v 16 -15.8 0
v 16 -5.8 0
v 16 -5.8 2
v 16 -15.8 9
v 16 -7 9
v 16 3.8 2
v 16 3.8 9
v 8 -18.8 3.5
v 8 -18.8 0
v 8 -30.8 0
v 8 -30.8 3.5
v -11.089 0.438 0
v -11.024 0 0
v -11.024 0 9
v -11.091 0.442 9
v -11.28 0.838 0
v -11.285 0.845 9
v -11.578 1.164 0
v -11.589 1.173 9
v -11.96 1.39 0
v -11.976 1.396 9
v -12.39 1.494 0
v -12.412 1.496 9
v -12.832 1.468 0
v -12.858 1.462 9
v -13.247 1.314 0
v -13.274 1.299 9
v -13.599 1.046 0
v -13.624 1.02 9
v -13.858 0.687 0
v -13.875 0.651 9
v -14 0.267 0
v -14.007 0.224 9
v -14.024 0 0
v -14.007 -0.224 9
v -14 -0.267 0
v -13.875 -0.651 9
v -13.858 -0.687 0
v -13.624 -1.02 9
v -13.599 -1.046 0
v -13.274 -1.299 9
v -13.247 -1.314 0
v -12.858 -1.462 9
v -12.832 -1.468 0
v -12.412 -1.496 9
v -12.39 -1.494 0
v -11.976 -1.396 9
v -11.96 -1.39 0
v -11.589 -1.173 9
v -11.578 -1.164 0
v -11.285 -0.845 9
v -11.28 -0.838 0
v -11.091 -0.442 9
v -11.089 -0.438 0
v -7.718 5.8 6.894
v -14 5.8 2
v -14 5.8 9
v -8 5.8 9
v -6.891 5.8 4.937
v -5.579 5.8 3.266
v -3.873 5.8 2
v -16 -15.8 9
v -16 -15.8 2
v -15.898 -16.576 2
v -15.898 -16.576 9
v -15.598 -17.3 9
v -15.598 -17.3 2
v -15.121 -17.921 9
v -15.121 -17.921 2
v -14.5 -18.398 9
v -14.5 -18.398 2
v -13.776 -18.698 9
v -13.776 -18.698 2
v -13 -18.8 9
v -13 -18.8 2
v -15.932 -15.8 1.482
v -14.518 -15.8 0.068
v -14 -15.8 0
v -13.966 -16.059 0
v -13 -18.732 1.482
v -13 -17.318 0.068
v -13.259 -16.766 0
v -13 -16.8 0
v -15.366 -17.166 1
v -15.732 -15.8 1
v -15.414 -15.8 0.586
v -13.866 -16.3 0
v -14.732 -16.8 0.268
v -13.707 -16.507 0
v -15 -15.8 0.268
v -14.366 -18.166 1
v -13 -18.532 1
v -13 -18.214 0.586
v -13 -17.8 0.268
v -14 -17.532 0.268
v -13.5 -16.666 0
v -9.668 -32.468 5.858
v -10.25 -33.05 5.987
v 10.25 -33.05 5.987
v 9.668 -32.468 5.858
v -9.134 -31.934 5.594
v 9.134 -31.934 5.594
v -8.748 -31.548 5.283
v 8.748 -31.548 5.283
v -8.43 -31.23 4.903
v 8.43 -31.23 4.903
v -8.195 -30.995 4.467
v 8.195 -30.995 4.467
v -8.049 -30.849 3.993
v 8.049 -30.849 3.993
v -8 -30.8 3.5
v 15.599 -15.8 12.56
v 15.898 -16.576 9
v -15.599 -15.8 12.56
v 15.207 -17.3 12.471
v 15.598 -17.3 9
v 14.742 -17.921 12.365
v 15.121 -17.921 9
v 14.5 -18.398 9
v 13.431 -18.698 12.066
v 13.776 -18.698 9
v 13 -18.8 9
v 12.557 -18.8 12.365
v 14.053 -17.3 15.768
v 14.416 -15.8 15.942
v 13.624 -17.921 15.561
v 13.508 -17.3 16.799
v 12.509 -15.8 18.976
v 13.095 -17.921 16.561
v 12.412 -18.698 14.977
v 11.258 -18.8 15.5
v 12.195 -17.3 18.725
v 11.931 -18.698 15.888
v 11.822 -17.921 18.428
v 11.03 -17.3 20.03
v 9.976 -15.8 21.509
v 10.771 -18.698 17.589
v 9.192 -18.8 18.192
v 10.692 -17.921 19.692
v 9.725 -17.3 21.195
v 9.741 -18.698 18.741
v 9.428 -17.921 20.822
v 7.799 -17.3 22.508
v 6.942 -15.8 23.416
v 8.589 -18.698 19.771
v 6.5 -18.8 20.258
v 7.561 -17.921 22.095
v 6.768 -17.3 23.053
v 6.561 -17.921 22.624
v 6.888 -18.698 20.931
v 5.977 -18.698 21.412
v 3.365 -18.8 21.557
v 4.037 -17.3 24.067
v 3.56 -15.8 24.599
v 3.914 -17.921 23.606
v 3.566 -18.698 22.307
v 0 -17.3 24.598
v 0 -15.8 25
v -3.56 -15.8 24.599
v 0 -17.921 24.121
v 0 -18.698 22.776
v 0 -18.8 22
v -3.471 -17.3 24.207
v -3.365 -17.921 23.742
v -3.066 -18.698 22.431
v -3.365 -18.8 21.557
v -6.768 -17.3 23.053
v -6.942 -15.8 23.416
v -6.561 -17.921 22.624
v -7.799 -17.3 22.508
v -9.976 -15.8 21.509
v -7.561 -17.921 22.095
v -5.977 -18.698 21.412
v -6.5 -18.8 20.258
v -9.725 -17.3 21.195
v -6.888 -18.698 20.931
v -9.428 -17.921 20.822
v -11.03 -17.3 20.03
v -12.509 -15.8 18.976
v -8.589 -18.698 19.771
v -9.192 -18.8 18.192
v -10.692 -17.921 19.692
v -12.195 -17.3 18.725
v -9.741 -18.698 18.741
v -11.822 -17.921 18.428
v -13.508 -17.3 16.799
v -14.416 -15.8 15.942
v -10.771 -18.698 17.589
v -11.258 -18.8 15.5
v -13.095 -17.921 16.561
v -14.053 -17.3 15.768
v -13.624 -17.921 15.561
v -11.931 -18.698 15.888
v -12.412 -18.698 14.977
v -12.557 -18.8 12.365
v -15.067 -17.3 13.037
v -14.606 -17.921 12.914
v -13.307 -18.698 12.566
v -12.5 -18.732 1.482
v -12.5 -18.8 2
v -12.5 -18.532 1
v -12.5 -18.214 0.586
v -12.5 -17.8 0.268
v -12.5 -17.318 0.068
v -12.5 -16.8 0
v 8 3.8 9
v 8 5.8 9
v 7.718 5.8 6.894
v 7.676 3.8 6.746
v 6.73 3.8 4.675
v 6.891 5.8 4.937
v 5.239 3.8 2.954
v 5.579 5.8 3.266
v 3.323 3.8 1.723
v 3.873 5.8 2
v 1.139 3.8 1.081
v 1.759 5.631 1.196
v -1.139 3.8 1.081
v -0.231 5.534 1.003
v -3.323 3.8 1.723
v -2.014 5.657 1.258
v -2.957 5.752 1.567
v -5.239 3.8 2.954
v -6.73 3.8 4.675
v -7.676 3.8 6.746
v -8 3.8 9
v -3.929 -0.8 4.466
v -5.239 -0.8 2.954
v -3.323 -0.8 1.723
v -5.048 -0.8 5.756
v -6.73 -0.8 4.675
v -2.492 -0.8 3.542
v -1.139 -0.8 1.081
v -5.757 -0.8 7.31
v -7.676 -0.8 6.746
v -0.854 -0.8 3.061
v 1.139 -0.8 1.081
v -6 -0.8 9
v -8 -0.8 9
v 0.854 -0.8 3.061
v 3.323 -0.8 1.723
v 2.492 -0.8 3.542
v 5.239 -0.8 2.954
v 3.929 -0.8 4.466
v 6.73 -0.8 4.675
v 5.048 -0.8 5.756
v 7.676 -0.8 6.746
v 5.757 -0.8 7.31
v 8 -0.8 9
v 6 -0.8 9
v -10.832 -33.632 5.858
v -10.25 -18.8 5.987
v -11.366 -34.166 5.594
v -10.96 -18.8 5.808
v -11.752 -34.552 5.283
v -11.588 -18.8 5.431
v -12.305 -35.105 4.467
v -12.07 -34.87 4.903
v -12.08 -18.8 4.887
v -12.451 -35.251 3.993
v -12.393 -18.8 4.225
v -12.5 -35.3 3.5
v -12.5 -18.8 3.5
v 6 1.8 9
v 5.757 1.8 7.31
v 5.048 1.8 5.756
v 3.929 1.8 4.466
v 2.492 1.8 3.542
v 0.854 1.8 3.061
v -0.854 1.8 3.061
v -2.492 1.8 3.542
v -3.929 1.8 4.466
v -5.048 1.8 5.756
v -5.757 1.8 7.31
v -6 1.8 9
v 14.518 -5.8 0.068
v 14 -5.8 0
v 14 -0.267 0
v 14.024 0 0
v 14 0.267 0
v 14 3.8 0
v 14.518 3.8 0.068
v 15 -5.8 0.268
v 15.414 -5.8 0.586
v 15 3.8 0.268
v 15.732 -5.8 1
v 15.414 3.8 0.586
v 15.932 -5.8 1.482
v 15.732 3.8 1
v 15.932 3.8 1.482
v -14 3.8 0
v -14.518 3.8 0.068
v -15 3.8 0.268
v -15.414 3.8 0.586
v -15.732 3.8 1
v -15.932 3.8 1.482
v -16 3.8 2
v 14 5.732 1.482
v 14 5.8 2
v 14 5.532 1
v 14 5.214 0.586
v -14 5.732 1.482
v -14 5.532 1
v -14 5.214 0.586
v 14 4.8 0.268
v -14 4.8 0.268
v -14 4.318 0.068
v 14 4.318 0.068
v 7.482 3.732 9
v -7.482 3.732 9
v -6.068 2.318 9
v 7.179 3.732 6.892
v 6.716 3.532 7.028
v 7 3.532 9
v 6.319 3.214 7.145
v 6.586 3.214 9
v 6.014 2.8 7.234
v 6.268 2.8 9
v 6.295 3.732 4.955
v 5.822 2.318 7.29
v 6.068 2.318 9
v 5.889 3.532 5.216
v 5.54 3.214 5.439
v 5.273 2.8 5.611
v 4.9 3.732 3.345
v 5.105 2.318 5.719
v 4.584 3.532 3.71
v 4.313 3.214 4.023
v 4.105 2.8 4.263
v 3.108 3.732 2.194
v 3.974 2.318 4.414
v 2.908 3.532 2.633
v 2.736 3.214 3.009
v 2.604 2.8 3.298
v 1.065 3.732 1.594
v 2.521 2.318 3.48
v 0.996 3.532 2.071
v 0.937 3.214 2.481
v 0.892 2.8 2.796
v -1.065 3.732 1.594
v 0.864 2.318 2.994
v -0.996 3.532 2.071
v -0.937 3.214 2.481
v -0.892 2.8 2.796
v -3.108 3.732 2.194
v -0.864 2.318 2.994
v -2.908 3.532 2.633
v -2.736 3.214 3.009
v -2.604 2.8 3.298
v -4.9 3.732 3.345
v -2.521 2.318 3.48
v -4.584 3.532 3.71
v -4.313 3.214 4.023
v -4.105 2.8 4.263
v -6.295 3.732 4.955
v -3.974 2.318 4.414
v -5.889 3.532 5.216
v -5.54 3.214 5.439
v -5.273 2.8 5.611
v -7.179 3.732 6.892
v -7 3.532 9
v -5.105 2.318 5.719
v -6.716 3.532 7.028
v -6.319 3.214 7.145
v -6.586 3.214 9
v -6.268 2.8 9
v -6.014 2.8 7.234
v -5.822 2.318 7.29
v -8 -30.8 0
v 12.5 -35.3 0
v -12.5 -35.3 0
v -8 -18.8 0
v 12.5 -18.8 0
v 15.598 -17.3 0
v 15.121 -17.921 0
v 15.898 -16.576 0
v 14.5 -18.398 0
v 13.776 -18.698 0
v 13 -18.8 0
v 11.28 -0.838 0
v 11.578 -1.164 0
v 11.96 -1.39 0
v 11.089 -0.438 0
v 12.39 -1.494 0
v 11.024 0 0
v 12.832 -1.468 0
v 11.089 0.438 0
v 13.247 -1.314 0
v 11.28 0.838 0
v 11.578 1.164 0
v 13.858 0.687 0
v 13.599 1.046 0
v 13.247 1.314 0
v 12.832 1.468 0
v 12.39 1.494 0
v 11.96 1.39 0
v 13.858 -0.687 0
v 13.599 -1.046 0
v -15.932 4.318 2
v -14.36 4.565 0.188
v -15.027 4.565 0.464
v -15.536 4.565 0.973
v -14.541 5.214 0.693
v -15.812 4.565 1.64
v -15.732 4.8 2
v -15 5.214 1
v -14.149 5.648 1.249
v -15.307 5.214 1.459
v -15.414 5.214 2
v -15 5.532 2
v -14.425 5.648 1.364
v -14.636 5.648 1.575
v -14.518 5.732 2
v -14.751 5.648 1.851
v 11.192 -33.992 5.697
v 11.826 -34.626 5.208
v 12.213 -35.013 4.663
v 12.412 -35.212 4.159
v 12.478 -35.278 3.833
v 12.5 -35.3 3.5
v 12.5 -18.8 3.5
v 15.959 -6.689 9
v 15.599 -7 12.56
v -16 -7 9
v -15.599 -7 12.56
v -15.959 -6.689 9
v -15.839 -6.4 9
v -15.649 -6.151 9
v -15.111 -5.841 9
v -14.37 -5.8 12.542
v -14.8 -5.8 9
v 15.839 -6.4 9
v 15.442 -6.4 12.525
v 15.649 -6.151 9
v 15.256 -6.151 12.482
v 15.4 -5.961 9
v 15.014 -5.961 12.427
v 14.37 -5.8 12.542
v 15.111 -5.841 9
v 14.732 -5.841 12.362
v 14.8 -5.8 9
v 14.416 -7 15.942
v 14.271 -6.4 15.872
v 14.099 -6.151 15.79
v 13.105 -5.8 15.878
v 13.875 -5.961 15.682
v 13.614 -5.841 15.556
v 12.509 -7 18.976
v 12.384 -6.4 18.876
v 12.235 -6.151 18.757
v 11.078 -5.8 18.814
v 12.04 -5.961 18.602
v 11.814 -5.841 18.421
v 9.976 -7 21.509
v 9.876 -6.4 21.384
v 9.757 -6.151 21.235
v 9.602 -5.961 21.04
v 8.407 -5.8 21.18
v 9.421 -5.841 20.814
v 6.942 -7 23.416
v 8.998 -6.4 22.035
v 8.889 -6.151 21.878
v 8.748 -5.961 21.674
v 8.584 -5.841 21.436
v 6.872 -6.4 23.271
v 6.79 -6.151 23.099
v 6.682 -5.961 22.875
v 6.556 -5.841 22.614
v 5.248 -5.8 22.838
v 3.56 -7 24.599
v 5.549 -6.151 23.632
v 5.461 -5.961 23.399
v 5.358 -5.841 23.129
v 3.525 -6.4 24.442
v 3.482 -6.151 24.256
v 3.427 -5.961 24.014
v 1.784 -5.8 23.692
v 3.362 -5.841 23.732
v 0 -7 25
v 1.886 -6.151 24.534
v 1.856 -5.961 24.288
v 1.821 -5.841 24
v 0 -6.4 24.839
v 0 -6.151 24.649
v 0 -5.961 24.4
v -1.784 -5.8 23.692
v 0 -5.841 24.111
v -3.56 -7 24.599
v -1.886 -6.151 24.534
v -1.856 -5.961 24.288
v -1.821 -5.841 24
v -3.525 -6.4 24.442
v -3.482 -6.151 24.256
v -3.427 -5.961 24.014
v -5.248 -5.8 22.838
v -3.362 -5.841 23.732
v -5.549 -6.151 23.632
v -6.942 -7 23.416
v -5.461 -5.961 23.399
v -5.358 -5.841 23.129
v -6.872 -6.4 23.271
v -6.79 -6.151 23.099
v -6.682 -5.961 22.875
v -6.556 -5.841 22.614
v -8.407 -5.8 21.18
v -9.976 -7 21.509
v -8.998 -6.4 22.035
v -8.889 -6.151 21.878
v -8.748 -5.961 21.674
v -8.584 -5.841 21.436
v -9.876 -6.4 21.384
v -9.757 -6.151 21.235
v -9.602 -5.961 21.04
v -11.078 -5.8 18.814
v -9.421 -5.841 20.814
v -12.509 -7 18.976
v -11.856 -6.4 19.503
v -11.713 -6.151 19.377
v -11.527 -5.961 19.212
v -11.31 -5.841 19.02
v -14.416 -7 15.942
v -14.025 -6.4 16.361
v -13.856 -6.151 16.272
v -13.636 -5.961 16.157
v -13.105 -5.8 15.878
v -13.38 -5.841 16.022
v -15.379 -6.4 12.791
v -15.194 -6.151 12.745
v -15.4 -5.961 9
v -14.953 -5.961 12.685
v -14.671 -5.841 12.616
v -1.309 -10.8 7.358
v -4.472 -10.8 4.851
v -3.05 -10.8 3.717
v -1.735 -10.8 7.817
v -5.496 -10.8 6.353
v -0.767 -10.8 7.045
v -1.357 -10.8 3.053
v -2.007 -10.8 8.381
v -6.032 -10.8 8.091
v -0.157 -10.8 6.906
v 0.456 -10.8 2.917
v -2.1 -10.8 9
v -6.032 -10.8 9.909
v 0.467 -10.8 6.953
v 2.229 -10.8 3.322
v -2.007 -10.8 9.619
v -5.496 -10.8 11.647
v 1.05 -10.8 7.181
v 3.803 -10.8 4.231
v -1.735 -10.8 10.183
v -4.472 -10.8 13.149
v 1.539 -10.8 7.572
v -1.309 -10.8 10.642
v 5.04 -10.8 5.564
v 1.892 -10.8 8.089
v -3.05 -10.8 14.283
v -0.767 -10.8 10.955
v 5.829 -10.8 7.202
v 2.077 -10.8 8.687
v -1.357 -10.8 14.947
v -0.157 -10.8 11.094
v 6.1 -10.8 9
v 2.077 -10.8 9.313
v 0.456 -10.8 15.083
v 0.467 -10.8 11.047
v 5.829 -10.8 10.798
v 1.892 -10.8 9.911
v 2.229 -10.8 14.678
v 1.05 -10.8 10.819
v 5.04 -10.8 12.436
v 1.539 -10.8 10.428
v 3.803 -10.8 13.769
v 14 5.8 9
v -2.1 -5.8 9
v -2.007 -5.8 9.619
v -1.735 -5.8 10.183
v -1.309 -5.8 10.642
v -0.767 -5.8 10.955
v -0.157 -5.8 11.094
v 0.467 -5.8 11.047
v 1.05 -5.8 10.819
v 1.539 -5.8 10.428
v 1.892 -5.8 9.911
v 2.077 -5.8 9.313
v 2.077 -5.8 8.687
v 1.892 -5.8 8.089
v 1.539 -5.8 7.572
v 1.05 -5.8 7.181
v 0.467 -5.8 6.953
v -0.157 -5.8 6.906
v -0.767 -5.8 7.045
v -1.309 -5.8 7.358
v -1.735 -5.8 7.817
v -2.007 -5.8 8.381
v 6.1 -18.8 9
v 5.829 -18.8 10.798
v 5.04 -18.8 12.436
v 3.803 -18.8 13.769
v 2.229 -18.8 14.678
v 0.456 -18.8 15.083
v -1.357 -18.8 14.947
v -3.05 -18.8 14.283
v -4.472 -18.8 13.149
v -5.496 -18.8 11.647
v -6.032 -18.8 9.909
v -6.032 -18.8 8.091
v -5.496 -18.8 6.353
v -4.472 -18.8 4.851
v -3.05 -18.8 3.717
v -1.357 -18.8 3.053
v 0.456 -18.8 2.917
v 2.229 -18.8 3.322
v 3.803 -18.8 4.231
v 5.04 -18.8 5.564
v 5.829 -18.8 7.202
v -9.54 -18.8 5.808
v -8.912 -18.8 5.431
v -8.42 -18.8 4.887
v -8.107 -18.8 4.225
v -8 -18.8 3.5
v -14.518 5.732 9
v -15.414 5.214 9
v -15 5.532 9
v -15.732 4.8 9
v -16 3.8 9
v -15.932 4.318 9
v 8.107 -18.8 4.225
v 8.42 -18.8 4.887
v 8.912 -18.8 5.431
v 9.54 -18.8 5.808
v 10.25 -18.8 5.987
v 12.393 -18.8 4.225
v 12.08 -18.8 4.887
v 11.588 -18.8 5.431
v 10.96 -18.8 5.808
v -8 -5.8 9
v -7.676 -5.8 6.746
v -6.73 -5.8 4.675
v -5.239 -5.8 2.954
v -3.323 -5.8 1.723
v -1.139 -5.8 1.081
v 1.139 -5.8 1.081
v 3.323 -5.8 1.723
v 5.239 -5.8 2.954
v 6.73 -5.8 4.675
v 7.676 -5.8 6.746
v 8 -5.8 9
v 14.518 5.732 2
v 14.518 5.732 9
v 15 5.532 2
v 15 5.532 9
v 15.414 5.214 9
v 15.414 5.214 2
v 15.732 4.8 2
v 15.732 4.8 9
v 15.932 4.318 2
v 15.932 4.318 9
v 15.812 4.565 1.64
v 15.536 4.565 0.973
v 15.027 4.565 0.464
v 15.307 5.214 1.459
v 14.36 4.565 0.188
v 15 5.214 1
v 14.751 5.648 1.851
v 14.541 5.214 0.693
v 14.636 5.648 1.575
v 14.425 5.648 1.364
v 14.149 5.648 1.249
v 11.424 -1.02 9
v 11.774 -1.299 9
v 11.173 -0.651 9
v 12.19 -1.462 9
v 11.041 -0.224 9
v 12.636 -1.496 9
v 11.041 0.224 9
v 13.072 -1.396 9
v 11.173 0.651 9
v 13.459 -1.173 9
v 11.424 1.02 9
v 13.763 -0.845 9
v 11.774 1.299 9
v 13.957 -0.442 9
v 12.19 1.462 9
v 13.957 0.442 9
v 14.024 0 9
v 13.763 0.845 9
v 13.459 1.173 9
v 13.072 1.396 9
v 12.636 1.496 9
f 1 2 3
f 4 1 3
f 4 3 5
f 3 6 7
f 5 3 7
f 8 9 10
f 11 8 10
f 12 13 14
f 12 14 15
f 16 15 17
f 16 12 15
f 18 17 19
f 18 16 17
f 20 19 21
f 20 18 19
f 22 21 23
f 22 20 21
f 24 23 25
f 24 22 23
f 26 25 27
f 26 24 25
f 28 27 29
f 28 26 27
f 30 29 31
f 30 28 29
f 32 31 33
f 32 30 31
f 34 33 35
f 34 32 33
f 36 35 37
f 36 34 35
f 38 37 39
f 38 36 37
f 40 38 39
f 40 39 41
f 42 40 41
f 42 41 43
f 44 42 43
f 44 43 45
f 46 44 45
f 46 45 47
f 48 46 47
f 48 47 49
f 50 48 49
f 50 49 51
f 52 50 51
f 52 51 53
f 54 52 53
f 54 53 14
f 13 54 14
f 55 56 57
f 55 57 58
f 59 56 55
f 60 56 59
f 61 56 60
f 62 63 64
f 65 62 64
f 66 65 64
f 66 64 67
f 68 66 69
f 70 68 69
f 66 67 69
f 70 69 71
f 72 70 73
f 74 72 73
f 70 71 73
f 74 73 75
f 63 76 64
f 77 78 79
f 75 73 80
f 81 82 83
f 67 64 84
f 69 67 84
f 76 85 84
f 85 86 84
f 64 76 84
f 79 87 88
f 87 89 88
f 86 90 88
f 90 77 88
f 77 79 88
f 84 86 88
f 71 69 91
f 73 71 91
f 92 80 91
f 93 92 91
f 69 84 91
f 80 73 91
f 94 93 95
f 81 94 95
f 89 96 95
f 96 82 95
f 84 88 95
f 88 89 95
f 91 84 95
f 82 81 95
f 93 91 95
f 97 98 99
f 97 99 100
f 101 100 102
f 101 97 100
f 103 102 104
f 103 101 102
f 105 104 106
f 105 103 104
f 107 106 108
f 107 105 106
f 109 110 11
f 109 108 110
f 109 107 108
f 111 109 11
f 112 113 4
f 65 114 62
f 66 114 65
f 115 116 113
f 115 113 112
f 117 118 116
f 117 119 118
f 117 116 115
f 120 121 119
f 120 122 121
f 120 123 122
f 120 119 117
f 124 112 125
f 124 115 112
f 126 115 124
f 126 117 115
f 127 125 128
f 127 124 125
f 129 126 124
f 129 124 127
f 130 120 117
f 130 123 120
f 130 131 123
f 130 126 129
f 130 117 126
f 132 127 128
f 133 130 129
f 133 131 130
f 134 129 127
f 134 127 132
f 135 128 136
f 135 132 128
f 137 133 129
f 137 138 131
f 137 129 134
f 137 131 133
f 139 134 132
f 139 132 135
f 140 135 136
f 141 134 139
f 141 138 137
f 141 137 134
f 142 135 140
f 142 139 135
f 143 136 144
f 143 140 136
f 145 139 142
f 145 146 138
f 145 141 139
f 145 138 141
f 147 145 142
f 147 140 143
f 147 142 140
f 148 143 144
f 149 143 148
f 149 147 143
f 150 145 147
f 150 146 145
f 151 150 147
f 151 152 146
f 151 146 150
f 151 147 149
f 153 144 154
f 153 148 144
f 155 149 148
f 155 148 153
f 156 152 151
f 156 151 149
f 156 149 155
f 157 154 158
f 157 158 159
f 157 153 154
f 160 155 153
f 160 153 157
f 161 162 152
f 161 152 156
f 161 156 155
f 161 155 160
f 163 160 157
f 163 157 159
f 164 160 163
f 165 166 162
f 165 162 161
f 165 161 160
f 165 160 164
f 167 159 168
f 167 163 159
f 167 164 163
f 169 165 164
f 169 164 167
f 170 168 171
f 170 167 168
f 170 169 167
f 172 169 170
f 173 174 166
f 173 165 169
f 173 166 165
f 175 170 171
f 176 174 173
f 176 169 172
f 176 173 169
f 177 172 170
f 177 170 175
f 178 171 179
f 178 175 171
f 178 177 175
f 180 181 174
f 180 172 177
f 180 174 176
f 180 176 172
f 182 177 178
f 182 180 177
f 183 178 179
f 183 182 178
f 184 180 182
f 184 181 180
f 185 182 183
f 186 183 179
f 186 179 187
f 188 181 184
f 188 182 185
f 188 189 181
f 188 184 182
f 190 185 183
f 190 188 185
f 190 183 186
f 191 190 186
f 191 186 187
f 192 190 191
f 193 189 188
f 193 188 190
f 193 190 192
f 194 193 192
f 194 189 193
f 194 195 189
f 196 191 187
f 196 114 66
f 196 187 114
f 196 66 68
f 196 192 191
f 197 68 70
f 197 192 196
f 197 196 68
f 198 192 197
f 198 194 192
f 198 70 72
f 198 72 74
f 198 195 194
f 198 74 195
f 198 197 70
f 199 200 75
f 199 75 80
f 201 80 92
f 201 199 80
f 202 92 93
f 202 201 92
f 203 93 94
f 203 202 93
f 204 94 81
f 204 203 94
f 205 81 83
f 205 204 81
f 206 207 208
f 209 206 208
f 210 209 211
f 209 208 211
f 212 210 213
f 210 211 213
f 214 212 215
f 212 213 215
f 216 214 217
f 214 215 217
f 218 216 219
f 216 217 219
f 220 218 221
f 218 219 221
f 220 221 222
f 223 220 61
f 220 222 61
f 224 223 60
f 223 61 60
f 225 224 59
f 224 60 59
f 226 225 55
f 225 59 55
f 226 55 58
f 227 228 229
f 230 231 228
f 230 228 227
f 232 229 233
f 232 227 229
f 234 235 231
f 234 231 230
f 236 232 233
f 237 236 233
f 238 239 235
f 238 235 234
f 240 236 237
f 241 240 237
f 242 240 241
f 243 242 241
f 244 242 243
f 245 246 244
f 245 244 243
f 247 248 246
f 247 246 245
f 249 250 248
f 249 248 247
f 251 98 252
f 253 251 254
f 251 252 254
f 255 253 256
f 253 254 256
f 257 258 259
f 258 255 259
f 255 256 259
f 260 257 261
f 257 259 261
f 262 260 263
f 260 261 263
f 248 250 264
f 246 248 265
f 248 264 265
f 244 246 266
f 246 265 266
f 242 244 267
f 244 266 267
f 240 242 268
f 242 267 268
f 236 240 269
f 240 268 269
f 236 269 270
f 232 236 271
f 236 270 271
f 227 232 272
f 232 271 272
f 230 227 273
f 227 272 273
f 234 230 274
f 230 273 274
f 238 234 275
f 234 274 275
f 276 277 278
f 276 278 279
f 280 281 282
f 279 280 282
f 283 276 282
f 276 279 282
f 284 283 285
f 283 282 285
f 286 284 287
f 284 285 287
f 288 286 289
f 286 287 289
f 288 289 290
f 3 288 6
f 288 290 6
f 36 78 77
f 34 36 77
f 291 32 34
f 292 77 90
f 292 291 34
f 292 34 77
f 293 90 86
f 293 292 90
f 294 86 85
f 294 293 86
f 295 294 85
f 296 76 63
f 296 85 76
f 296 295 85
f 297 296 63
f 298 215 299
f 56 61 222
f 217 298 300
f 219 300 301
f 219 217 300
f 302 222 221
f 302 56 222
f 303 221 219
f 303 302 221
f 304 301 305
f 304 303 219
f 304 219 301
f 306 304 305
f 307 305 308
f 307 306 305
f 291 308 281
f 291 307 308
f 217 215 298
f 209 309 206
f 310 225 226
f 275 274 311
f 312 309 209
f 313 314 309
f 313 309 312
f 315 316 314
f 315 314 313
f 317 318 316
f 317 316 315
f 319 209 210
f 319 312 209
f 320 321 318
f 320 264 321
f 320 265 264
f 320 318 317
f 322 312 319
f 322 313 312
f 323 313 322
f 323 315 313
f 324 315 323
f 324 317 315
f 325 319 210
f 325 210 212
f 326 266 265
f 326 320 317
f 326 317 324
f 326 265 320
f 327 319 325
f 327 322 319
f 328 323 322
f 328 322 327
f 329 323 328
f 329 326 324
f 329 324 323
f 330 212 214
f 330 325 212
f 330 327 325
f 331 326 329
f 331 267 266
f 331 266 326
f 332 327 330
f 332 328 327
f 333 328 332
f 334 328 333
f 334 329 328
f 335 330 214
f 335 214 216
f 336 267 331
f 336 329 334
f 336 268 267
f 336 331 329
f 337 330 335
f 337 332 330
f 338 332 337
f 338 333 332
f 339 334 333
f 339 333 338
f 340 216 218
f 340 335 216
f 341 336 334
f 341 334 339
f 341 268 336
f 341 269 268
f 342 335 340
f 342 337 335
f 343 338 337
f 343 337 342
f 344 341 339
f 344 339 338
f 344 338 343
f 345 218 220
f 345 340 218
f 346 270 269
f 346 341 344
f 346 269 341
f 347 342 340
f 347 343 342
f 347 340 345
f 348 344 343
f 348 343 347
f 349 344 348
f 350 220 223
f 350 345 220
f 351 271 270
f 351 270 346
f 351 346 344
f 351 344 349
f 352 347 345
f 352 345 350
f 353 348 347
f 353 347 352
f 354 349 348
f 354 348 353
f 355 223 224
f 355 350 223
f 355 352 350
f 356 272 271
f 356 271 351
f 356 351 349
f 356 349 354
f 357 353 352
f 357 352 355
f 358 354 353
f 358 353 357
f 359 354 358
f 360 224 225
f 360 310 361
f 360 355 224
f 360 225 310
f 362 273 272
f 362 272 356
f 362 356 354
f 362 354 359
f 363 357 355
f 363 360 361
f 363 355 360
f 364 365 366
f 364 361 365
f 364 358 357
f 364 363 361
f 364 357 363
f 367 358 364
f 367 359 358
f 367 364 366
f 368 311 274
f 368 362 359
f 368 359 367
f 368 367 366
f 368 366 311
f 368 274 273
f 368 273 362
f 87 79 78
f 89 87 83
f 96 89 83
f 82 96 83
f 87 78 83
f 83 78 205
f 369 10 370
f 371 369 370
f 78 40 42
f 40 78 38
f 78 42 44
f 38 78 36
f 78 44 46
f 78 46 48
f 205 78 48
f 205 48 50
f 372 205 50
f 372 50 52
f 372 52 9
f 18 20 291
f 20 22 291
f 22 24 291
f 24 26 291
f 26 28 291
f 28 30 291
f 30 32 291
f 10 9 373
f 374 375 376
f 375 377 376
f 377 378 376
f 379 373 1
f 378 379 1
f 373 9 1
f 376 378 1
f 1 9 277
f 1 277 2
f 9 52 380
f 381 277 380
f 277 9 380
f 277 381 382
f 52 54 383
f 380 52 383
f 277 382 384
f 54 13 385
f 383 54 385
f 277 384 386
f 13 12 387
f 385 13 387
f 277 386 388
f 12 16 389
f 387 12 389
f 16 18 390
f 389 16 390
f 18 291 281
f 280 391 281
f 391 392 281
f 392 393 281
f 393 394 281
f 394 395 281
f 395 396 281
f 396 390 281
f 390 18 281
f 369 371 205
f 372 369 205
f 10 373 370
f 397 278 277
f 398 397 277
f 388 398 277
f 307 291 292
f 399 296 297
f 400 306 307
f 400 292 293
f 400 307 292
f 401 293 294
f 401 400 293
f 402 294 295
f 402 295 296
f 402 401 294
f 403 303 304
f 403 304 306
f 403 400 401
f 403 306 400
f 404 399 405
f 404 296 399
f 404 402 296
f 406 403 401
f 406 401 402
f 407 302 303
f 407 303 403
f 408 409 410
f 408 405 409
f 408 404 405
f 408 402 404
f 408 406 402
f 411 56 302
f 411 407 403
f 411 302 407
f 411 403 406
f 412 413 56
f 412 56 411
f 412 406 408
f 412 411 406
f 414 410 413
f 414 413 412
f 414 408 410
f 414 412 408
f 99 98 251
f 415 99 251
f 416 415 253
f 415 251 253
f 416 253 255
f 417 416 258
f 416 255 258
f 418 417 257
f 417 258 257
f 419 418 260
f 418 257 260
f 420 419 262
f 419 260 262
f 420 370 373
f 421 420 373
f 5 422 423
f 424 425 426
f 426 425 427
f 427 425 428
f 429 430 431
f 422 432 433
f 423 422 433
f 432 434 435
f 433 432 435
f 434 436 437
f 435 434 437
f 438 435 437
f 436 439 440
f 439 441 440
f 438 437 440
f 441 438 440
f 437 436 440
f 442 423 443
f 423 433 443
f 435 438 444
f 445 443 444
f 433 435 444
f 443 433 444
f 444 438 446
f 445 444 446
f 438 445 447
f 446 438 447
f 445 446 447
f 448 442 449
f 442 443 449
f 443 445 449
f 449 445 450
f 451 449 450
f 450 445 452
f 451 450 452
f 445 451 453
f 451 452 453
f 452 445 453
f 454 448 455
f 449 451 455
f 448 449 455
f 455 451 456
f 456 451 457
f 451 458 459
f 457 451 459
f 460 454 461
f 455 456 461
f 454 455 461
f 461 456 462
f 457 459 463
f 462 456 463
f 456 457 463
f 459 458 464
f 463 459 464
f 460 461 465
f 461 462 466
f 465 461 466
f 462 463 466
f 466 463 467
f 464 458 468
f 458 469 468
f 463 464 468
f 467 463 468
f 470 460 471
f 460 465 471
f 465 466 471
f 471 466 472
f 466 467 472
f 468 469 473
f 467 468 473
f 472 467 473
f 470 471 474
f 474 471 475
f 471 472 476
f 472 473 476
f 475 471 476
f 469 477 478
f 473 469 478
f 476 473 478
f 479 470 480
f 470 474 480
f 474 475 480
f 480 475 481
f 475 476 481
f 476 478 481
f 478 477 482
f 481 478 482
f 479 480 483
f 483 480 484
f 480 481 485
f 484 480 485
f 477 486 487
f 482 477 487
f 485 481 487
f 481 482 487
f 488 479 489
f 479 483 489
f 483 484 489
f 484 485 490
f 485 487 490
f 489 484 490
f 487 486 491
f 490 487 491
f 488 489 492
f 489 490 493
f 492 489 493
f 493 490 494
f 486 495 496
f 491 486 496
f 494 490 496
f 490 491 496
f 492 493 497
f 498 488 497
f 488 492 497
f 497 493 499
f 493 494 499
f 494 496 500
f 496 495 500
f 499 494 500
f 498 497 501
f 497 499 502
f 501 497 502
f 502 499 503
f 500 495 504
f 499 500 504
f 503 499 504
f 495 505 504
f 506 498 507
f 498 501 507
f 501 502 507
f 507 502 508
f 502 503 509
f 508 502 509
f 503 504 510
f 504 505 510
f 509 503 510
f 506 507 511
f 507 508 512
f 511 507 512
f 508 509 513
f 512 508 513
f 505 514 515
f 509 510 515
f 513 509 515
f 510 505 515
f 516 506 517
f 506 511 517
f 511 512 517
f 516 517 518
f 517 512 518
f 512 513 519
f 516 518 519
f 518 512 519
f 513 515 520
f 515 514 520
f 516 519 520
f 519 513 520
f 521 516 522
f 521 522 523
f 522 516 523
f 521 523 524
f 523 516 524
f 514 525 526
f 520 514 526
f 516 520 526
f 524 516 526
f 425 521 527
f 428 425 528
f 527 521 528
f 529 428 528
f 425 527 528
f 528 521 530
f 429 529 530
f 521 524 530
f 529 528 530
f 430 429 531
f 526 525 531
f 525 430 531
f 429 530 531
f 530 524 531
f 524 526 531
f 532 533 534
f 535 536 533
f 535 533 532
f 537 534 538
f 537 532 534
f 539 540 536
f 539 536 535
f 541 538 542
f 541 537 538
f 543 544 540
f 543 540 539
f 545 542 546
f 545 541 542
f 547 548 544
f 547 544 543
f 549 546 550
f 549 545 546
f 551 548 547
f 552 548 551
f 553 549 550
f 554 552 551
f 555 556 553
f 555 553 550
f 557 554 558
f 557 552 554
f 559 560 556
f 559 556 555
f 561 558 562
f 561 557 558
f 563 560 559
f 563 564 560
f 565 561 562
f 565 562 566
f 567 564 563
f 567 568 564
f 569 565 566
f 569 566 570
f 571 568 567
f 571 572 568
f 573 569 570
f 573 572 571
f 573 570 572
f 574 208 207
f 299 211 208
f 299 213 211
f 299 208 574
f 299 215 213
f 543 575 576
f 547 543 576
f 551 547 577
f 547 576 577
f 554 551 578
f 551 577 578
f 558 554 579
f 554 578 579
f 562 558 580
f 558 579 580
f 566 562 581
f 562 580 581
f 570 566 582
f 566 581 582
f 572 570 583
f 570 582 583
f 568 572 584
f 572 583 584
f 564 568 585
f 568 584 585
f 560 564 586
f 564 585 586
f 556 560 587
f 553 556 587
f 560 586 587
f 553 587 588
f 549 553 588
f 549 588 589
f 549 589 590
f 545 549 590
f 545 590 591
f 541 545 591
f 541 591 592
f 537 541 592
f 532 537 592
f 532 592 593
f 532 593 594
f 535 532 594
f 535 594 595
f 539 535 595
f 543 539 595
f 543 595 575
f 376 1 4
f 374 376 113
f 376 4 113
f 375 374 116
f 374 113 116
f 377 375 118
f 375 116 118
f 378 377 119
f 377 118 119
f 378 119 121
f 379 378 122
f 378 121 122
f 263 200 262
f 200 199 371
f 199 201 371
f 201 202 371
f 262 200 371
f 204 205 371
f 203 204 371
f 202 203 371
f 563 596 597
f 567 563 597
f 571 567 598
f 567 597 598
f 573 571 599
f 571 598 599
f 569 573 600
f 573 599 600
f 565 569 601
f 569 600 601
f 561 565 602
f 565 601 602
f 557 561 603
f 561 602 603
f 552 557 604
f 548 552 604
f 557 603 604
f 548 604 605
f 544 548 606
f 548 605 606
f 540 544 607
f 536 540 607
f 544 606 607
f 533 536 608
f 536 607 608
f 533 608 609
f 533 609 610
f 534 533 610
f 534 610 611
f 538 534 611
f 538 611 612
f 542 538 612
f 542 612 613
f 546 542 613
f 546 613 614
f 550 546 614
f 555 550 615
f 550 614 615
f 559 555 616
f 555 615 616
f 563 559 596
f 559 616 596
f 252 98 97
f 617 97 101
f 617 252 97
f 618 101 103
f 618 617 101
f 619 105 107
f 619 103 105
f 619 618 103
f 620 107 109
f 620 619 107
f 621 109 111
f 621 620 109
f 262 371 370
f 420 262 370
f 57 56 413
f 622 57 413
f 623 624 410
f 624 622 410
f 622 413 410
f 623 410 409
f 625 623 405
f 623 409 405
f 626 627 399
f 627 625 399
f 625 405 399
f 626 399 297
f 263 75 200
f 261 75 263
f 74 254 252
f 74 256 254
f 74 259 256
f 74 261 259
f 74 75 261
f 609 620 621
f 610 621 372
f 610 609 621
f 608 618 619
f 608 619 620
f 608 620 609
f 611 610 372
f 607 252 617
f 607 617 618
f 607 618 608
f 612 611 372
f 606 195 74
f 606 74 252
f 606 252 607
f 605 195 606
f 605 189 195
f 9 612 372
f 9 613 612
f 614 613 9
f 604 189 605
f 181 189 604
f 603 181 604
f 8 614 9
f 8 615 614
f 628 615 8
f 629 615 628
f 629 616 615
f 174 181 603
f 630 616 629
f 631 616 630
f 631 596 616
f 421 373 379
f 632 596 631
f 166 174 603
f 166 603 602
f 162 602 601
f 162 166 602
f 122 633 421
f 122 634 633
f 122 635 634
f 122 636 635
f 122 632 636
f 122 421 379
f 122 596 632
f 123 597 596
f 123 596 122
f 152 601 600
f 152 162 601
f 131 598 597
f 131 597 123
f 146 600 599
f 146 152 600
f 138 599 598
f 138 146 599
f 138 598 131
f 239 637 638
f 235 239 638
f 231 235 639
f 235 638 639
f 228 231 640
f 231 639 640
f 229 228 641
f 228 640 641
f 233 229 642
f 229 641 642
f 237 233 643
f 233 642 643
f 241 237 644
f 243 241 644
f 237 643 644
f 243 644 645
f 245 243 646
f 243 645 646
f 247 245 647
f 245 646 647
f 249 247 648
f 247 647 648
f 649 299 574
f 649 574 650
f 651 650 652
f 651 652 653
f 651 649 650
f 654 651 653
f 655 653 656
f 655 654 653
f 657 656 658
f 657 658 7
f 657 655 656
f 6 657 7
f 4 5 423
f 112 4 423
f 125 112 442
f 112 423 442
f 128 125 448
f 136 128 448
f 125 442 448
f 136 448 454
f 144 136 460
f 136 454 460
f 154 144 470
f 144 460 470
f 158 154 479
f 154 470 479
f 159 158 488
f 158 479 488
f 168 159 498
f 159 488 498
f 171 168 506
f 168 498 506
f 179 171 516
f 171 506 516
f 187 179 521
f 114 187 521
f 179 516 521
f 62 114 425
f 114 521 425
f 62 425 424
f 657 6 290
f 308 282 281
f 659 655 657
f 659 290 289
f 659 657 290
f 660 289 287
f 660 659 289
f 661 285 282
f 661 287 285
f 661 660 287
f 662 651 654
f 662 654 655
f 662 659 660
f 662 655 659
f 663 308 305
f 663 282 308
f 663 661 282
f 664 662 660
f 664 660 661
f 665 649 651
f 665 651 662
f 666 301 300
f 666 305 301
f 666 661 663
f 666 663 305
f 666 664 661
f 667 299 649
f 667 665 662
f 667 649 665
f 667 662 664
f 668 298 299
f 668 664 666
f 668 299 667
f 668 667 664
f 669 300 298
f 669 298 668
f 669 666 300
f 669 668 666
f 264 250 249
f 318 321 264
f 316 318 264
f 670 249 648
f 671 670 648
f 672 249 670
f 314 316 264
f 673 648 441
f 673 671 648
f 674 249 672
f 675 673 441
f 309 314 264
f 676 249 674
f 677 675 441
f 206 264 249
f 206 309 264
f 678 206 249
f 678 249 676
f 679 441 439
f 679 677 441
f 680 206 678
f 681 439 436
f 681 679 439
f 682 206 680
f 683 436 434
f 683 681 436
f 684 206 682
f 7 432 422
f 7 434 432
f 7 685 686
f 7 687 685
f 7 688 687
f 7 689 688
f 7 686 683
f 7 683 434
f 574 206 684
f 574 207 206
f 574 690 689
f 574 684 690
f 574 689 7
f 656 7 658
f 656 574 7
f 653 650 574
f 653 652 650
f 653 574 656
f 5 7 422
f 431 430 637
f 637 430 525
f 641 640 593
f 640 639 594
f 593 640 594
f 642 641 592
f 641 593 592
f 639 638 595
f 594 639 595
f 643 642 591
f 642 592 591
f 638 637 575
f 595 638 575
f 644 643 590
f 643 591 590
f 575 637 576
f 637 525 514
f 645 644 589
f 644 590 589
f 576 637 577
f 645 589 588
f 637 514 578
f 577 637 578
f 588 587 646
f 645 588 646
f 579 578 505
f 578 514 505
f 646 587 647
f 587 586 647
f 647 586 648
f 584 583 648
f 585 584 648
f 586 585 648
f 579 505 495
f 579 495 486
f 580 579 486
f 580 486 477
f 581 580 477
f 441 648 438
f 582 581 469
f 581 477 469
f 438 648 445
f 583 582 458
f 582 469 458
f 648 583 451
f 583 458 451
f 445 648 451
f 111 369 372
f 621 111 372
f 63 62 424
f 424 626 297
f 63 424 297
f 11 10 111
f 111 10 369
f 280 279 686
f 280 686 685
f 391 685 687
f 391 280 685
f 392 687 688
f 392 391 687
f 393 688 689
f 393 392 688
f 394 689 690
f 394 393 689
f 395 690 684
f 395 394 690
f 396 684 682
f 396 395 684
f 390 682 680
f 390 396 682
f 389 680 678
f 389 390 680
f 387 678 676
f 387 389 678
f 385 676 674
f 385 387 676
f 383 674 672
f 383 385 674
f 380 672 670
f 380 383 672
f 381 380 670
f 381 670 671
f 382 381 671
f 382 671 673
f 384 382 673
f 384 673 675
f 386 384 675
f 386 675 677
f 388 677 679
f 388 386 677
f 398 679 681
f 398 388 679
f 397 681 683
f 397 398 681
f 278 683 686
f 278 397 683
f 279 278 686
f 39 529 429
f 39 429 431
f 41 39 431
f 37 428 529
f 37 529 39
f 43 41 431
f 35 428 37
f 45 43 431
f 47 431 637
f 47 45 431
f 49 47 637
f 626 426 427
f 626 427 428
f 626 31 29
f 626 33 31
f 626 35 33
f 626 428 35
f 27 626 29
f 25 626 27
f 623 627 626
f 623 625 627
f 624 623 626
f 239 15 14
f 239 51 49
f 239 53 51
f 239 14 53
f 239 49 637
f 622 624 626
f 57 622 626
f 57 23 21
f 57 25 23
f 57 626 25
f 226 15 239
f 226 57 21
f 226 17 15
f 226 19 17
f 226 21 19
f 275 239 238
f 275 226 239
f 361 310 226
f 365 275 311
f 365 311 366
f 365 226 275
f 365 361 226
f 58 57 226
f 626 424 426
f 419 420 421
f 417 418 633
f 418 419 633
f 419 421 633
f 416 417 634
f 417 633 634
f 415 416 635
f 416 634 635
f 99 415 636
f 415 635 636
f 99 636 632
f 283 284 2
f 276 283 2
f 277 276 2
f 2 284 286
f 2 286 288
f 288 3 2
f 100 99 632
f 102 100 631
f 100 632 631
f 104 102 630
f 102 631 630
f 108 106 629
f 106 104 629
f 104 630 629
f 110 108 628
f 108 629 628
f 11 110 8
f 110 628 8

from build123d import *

# Parameters (mm, degrees)
F0_W          = 32
F0_H          = 11.6
F0_R          = 1.5
F1_DEPTH      = 9
F2_R          = 8
F1_FACE1_W    = 32
F1_FACE1_H    = 9
F3_DEPTH      = 5
F4_R          = 8
F5_DEPTH      = 2
F6_R          = 6
F7_DEPTH      = 25
F8_T1_DEPTH   = 28
F8_T3_DEPTH   = 12
F8_T5_DEPTH   = 14.6
F8_S9_W       = 2
F8_S9_H       = 2
F8_T10_DEPTH  = 2
F8_S15_W      = 2
F8_S15_H      = 2
F8_T16_DEPTH  = 2
F8_T20_ANGLE  = 275.6465366004
F10_DEPTH     = 13
F12_DEPTH     = 6
F13_T1_DEPTH  = 12
F13_T3_DEPTH  = 22.75
F13_T5_DEPTH  = 16
F13_T7_DEPTH  = 37.5
F13_T13_DEPTH = 18.25
F13_T17_DEPTH = 22.25
F13_T24_DEPTH = 18.25
F13_T28_DEPTH = 22.25
F14_R         = 3
F15_R         = 1.2
F16_R         = 6.1
F17_DEPTH     = 8
F18_T3_ANGLE  = 90
F18_T6_DEPTH  = 15
F18_T9_DEPTH  = 0.5
F19_R         = 2.1
F20_DEPTH     = 7


# Not quite as in the source:
# - a fillet or chamfer that OpenCascade refuses, or shapes differently, is made with other operations: its cross-section is extruded or revolved along the edge and cut away or added


with BuildPart() as f1:
    # F0 (on Top) → F1 (new body)
    with BuildSketch(Plane.XY):
        Rectangle(F0_W, F0_H)
        with Locations((-12.524, 0)):
            Circle(F0_R, mode=Mode.SUBTRACT)
        with Locations((12.524, 0)):
            Circle(F0_R, mode=Mode.SUBTRACT)
    extrude(amount=F1_DEPTH)

    # F2 (on face) + F1_face1 (on face) → F3 (cut)
    with BuildSketch(Plane.XZ.offset(5.8)):
        with Locations((0, 9)):
            Circle(F2_R)
    with BuildSketch(Plane(origin=(0, 5.8, 4.5), x_dir=(-1, 0, 0), z_dir=(0, 1, 0))):
        Rectangle(F1_FACE1_W, F1_FACE1_H)
    extrude(amount=-F3_DEPTH, dir=(0, -1, 0), mode=Mode.SUBTRACT)

    # F4 (on face) → F5 (cut)
    with BuildSketch(Plane(origin=(0, 5.8, 0), x_dir=(-1, 0, 0), z_dir=(0, 1, 0))):
        with Locations((0, 9)):
            Circle(F4_R)
    extrude(amount=-F5_DEPTH, mode=Mode.SUBTRACT)

    # F6 (on face) → F7 (cut)
    with BuildSketch(Plane(origin=(0, 3.8, 0), x_dir=(-1, 0, 0), z_dir=(0, 1, 0))):
        with Locations((0, 9)):
            Circle(F6_R)
    extrude(amount=-F7_DEPTH, mode=Mode.SUBTRACT)

    # F8: fillet of radius 2 on 6 edges, made by hand

    # F8_s2 → F8_t1 (cut)
    with BuildSketch(Plane.YZ.offset(-14)):
        with BuildLine():
            ThreePointArc((5.8, 2), (5.2142135624, 0.5857864376), (3.8, 0))
            Line((3.8, 0), (5.8, 0))
            Line((5.8, 0), (5.8, 2))
        make_face()
    extrude(amount=F8_T1_DEPTH, mode=Mode.SUBTRACT)

    # F8_s4 → F8_t3 (cut)
    with BuildSketch(Plane.XY.offset(2)):
        with BuildLine():
            ThreePointArc((-14, 5.8), (-15.4142135624, 5.2142135624), (-16, 3.8))
            Line((-16, 3.8), (-16, 5.8))
            Line((-16, 5.8), (-14, 5.8))
        make_face()
        with BuildLine():
            ThreePointArc((14, 5.8), (15.4142135624, 5.2142135624), (16, 3.8))
            Line((16, 3.8), (16, 5.8))
            Line((16, 5.8), (14, 5.8))
        make_face()
    extrude(amount=F8_T3_DEPTH, mode=Mode.SUBTRACT)

    # F8_s6 → F8_t5 (cut)
    with BuildSketch(Plane.XZ.offset(-3.8)):
        with BuildLine():
            ThreePointArc((-14, 0), (-15.4142135624, 0.5857864376), (-16, 2))
            Line((-16, 2), (-16, 0))
            Line((-16, 0), (-14, 0))
        make_face()
        with BuildLine():
            ThreePointArc((14, 0), (15.4142135624, 0.5857864376), (16, 2))
            Line((16, 2), (16, 0))
            Line((16, 0), (14, 0))
        make_face()
    extrude(amount=F8_T5_DEPTH, mode=Mode.SUBTRACT)


with BuildPart() as f8_tool8:
    # F8_s9 → F8_t10 (new body)
    with BuildSketch(Plane.XZ.offset(-3.8)):
        with Locations((15, 1)):
            Rectangle(F8_S9_W, F8_S9_H)
    extrude(amount=-F8_T10_DEPTH)

    # F8_s11 → F8_t12 (revolve, cut)
    with BuildSketch(Plane(origin=(14, 3.8, 2), x_dir=(-0.7071067812, 0, 0.7071067812), z_dir=(-0.7071067812, 0, -0.7071067812))):
        with BuildLine():
            ThreePointArc((0, -2), (2, 0), (0, 2))
            Line((0, 2), (0, -2))
        make_face()
    revolve(axis=Axis((14, 3.8, 2), (0, 1, 0)), mode=Mode.SUBTRACT)


with BuildPart() as f1_1:
    add(f1.part)

    # F8_t7: cut F8_tool8
    add(f8_tool8.part, mode=Mode.SUBTRACT)


with BuildPart() as f8_tool14:
    # F8_s15 → F8_t16 (new body)
    with BuildSketch(Plane.XZ.offset(-3.8)):
        with Locations((-15, 1)):
            Rectangle(F8_S15_W, F8_S15_H)
    extrude(amount=-F8_T16_DEPTH)

    # F8_s17 → F8_t18 (revolve, cut)
    with BuildSketch(Plane(origin=(-14, 3.8, 2), x_dir=(0.7071067812, 0, 0.7071067812), z_dir=(-0.7071067812, 0, 0.7071067812))):
        with BuildLine():
            ThreePointArc((0, -2), (2, 0), (0, 2))
            Line((0, 2), (0, -2))
        make_face()
    revolve(axis=Axis((-14, 3.8, 2), (0, 1, 0)), mode=Mode.SUBTRACT)


with BuildPart() as f1_2:
    add(f1_1.part)

    # F8_t13: cut F8_tool14
    add(f8_tool14.part, mode=Mode.SUBTRACT)

    # F8_s19 → F8_t20 (revolve, cut)
    with BuildSketch(Plane(origin=(-4.4781651596, 0, 4.057239564), x_dir=(0, 1, 0), z_dir=(-0.7410773266, 0, 0.6714196869))):
        with BuildLine():
            ThreePointArc((3.8, -14.6696959394), (3.2142135624, -13.255482377), (1.8, -12.6696959394))
            Line((1.8, -12.6696959394), (3.8, -12.6696959394))
            Line((3.8, -12.6696959394), (3.8, -14.6696959394))
        make_face()
    revolve(axis=Axis((0, 3.8, 9), (0, 1, 0)), revolution_arc=F8_T20_ANGLE, mode=Mode.SUBTRACT)

    # F9 (on face) → F10 (join)
    with BuildSketch(Plane.XZ.offset(5.8)):
        with BuildLine():
            Line((16, 0), (16, 9))
            ThreePointArc((16, 9), (0, 25), (-16, 9))
            Line((-16, 9), (-16, 0))
            Line((-16, 0), (-13.2287565553, 0))
            Line((-13.2287565553, 0), (0, 0))
            Line((0, 0), (13.2287565553, 0))
            Line((13.2287565553, 0), (16, 0))
        make_face()
    extrude(amount=F10_DEPTH)

    # F11 (on Top) → F12 (join)
    with BuildSketch(Plane.XY):
        Polygon((-8, -30.8), (-8, -18.8), (-12.5, -18.8), (-12.5, -35.3), (12.5, -35.3), (12.5, -18.8), (8, -18.8), (8, -30.8), align=None)
    extrude(amount=F12_DEPTH)

    # F13: fillet of radius 2.5 on 6 edges, made by hand

    # F13_s2 → F13_t1 (cut)
    with BuildSketch(Plane.XZ.offset(18.8)):
        with BuildLine():
            ThreePointArc((-10.5, 6), (-8.732233047, 5.267766953), (-8, 3.5))
            Line((-8, 3.5), (-8, 6))
            Line((-8, 6), (-10.5, 6))
        make_face()
        with BuildLine():
            ThreePointArc((10.5, 6), (8.732233047, 5.267766953), (8, 3.5))
            Line((8, 3.5), (8, 6))
            Line((8, 6), (10.5, 6))
        make_face()
    extrude(amount=F13_T1_DEPTH, mode=Mode.SUBTRACT)

    # F13_s4 → F13_t3 (cut)
    with BuildSketch(Plane.XZ.offset(18.8)):
        with BuildLine():
            ThreePointArc((-10, 6), (-11.767766953, 5.267766953), (-12.5, 3.5))
            Line((-12.5, 3.5), (-12.5, 6))
            Line((-12.5, 6), (-10, 6))
        make_face()
        with BuildLine():
            ThreePointArc((12.5, 3.5), (11.767766953, 5.267766953), (10, 6))
            Line((10, 6), (12.5, 6))
            Line((12.5, 6), (12.5, 3.5))
        make_face()
    extrude(amount=F13_T3_DEPTH, mode=Mode.SUBTRACT)

    # F13_s6 → F13_t5 (cut)
    with BuildSketch(Plane.YZ.offset(-8)):
        with BuildLine():
            ThreePointArc((-33.3, 6), (-31.532233047, 5.267766953), (-30.8, 3.5))
            Line((-30.8, 3.5), (-30.8, 6))
            Line((-30.8, 6), (-33.3, 6))
        make_face()
    extrude(amount=F13_T5_DEPTH, mode=Mode.SUBTRACT)

    # F13_s8 → F13_t7 (cut)
    with BuildSketch(Plane.YZ.offset(-18.75)):
        with BuildLine():
            ThreePointArc((-32.8, 6), (-34.567766953, 5.267766953), (-35.3, 3.5))
            Line((-35.3, 3.5), (-35.3, 6))
            Line((-35.3, 6), (-32.8, 6))
        make_face()
    extrude(amount=F13_T7_DEPTH, mode=Mode.SUBTRACT)


with BuildPart() as f13_tool11:
    # F13_s12 → F13_t13 (new body)
    with BuildSketch(Plane.XZ.offset(37.05)):
        with BuildLine():
            ThreePointArc((-10.5, 6), (-8.732233047, 5.267766953), (-8, 3.5))
            Line((-8, 3.5), (-8, 6))
            Line((-8, 6), (-10.5, 6))
        make_face()
    extrude(amount=-F13_T13_DEPTH)

    split(bisect_by=Plane.XZ.offset(30.8), keep=Keep.TOP)


with BuildPart() as f13_tool15:
    # F13_s16 → F13_t17 (new body)
    with BuildSketch(Plane.YZ.offset(8)):
        with BuildLine():
            ThreePointArc((-33.3, 6), (-31.532233047, 5.267766953), (-30.8, 3.5))
            Line((-30.8, 3.5), (-30.8, 6))
            Line((-30.8, 6), (-33.3, 6))
        make_face()
    extrude(amount=-F13_T17_DEPTH)

    split(bisect_by=Plane.YZ.offset(-8), keep=Keep.BOTTOM)


with BuildPart() as f13_tool11_1:
    add(f13_tool11.part)

    # F13_t19: intersect F13_tool15
    add(f13_tool15.part, mode=Mode.INTERSECT)


with BuildPart() as f1_3:
    add(f1_2.part)

    # F13_t9: cut F13_tool11
    add(f13_tool11_1.part, mode=Mode.SUBTRACT)


with BuildPart() as f13_tool22:
    # F13_s23 → F13_t24 (new body)
    with BuildSketch(Plane.XZ.offset(18.8)):
        with BuildLine():
            ThreePointArc((10.5, 6), (8.732233047, 5.267766953), (8, 3.5))
            Line((8, 3.5), (8, 6))
            Line((8, 6), (10.5, 6))
        make_face()
    extrude(amount=F13_T24_DEPTH)

    split(bisect_by=Plane.XZ.offset(30.8), keep=Keep.TOP)


with BuildPart() as f13_tool26:
    # F13_s27 → F13_t28 (new body)
    with BuildSketch(Plane.YZ.offset(14.25)):
        with BuildLine():
            ThreePointArc((-33.3, 6), (-31.532233047, 5.267766953), (-30.8, 3.5))
            Line((-30.8, 3.5), (-30.8, 6))
            Line((-30.8, 6), (-33.3, 6))
        make_face()
    extrude(amount=-F13_T28_DEPTH)

    split(bisect_by=Plane.YZ.offset(8), keep=Keep.TOP)


with BuildPart() as f13_tool22_1:
    add(f13_tool22.part)

    # F13_t30: intersect F13_tool26
    add(f13_tool26.part, mode=Mode.INTERSECT)


with BuildPart() as f1_4:
    add(f1_3.part)

    # F13_t20: cut F13_tool22
    add(f13_tool22_1.part, mode=Mode.SUBTRACT)

    # F14
    f14_edges = [f1_4.edges().sort_by_distance(p)[0] for p in [
        (0, -18.8, 25),
        (16, -18.8, 4.5),
    ]]
    fillet(f14_edges, radius=F14_R)

    # F15
    f15_edges = [f1_4.edges().sort_by_distance(p)[0] for p in [
        (0, -5.8, 25),
    ]]
    fillet(f15_edges, radius=F15_R)

    # F16 (on face) → F17 (cut)
    with BuildSketch(Plane.XZ.offset(18.8)):
        with Locations((0, 9)):
            Circle(F16_R)
    extrude(amount=-F17_DEPTH, mode=Mode.SUBTRACT)

    # F18: fillet of radius 2 on 3 edges, made by hand


with BuildPart() as f18_tool1:
    # F18_s2 → F18_t3 (revolve)
    with BuildSketch(Plane.XZ.offset(15.8)):
        with BuildLine():
            ThreePointArc((-16, 2), (-15.4142135624, 0.5857864376), (-14, 0))
            Line((-14, 0), (-16, 0))
            Line((-16, 0), (-16, 2))
        make_face()
    revolve(axis=Axis((-13, -15.8, 0), (0, 0, 1)), revolution_arc=F18_T3_ANGLE)


with BuildPart() as f18_tool4:
    # F18_s5 → F18_t6 (new body)
    with BuildSketch(Plane.XZ.offset(0.8)):
        with BuildLine():
            ThreePointArc((-16, 2), (-15.4142135624, 0.5857864376), (-14, 0))
            Line((-14, 0), (-16, 0))
            Line((-16, 0), (-16, 2))
        make_face()
    extrude(amount=F18_T6_DEPTH)


with BuildPart() as f18_tool7:
    # F18_s8 → F18_t9 (new body)
    with BuildSketch(Plane.YZ.offset(-12.5)):
        with BuildLine():
            ThreePointArc((-18.8, 2), (-18.2142135624, 0.5857864376), (-16.8, 0))
            Line((-16.8, 0), (-18.8, 0))
            Line((-18.8, 0), (-18.8, 2))
        make_face()
    extrude(amount=-F18_T9_DEPTH)


with BuildPart() as f1_5:
    add(f1_4.part)

    # F18_t10: cut F18_tool1, F18_tool4, F18_tool7
    add([f18_tool1.part, f18_tool4.part, f18_tool7.part], mode=Mode.SUBTRACT)

    # F19 (on face) → F20 (cut)
    with BuildSketch(Plane(origin=(0, -5.8, 0), x_dir=(-1, 0, 0), z_dir=(0, 1, 0))):
        with Locations((0, 9)):
            Circle(F19_R)
    extrude(amount=-F20_DEPTH, mode=Mode.SUBTRACT)


solid = f1_5.part
